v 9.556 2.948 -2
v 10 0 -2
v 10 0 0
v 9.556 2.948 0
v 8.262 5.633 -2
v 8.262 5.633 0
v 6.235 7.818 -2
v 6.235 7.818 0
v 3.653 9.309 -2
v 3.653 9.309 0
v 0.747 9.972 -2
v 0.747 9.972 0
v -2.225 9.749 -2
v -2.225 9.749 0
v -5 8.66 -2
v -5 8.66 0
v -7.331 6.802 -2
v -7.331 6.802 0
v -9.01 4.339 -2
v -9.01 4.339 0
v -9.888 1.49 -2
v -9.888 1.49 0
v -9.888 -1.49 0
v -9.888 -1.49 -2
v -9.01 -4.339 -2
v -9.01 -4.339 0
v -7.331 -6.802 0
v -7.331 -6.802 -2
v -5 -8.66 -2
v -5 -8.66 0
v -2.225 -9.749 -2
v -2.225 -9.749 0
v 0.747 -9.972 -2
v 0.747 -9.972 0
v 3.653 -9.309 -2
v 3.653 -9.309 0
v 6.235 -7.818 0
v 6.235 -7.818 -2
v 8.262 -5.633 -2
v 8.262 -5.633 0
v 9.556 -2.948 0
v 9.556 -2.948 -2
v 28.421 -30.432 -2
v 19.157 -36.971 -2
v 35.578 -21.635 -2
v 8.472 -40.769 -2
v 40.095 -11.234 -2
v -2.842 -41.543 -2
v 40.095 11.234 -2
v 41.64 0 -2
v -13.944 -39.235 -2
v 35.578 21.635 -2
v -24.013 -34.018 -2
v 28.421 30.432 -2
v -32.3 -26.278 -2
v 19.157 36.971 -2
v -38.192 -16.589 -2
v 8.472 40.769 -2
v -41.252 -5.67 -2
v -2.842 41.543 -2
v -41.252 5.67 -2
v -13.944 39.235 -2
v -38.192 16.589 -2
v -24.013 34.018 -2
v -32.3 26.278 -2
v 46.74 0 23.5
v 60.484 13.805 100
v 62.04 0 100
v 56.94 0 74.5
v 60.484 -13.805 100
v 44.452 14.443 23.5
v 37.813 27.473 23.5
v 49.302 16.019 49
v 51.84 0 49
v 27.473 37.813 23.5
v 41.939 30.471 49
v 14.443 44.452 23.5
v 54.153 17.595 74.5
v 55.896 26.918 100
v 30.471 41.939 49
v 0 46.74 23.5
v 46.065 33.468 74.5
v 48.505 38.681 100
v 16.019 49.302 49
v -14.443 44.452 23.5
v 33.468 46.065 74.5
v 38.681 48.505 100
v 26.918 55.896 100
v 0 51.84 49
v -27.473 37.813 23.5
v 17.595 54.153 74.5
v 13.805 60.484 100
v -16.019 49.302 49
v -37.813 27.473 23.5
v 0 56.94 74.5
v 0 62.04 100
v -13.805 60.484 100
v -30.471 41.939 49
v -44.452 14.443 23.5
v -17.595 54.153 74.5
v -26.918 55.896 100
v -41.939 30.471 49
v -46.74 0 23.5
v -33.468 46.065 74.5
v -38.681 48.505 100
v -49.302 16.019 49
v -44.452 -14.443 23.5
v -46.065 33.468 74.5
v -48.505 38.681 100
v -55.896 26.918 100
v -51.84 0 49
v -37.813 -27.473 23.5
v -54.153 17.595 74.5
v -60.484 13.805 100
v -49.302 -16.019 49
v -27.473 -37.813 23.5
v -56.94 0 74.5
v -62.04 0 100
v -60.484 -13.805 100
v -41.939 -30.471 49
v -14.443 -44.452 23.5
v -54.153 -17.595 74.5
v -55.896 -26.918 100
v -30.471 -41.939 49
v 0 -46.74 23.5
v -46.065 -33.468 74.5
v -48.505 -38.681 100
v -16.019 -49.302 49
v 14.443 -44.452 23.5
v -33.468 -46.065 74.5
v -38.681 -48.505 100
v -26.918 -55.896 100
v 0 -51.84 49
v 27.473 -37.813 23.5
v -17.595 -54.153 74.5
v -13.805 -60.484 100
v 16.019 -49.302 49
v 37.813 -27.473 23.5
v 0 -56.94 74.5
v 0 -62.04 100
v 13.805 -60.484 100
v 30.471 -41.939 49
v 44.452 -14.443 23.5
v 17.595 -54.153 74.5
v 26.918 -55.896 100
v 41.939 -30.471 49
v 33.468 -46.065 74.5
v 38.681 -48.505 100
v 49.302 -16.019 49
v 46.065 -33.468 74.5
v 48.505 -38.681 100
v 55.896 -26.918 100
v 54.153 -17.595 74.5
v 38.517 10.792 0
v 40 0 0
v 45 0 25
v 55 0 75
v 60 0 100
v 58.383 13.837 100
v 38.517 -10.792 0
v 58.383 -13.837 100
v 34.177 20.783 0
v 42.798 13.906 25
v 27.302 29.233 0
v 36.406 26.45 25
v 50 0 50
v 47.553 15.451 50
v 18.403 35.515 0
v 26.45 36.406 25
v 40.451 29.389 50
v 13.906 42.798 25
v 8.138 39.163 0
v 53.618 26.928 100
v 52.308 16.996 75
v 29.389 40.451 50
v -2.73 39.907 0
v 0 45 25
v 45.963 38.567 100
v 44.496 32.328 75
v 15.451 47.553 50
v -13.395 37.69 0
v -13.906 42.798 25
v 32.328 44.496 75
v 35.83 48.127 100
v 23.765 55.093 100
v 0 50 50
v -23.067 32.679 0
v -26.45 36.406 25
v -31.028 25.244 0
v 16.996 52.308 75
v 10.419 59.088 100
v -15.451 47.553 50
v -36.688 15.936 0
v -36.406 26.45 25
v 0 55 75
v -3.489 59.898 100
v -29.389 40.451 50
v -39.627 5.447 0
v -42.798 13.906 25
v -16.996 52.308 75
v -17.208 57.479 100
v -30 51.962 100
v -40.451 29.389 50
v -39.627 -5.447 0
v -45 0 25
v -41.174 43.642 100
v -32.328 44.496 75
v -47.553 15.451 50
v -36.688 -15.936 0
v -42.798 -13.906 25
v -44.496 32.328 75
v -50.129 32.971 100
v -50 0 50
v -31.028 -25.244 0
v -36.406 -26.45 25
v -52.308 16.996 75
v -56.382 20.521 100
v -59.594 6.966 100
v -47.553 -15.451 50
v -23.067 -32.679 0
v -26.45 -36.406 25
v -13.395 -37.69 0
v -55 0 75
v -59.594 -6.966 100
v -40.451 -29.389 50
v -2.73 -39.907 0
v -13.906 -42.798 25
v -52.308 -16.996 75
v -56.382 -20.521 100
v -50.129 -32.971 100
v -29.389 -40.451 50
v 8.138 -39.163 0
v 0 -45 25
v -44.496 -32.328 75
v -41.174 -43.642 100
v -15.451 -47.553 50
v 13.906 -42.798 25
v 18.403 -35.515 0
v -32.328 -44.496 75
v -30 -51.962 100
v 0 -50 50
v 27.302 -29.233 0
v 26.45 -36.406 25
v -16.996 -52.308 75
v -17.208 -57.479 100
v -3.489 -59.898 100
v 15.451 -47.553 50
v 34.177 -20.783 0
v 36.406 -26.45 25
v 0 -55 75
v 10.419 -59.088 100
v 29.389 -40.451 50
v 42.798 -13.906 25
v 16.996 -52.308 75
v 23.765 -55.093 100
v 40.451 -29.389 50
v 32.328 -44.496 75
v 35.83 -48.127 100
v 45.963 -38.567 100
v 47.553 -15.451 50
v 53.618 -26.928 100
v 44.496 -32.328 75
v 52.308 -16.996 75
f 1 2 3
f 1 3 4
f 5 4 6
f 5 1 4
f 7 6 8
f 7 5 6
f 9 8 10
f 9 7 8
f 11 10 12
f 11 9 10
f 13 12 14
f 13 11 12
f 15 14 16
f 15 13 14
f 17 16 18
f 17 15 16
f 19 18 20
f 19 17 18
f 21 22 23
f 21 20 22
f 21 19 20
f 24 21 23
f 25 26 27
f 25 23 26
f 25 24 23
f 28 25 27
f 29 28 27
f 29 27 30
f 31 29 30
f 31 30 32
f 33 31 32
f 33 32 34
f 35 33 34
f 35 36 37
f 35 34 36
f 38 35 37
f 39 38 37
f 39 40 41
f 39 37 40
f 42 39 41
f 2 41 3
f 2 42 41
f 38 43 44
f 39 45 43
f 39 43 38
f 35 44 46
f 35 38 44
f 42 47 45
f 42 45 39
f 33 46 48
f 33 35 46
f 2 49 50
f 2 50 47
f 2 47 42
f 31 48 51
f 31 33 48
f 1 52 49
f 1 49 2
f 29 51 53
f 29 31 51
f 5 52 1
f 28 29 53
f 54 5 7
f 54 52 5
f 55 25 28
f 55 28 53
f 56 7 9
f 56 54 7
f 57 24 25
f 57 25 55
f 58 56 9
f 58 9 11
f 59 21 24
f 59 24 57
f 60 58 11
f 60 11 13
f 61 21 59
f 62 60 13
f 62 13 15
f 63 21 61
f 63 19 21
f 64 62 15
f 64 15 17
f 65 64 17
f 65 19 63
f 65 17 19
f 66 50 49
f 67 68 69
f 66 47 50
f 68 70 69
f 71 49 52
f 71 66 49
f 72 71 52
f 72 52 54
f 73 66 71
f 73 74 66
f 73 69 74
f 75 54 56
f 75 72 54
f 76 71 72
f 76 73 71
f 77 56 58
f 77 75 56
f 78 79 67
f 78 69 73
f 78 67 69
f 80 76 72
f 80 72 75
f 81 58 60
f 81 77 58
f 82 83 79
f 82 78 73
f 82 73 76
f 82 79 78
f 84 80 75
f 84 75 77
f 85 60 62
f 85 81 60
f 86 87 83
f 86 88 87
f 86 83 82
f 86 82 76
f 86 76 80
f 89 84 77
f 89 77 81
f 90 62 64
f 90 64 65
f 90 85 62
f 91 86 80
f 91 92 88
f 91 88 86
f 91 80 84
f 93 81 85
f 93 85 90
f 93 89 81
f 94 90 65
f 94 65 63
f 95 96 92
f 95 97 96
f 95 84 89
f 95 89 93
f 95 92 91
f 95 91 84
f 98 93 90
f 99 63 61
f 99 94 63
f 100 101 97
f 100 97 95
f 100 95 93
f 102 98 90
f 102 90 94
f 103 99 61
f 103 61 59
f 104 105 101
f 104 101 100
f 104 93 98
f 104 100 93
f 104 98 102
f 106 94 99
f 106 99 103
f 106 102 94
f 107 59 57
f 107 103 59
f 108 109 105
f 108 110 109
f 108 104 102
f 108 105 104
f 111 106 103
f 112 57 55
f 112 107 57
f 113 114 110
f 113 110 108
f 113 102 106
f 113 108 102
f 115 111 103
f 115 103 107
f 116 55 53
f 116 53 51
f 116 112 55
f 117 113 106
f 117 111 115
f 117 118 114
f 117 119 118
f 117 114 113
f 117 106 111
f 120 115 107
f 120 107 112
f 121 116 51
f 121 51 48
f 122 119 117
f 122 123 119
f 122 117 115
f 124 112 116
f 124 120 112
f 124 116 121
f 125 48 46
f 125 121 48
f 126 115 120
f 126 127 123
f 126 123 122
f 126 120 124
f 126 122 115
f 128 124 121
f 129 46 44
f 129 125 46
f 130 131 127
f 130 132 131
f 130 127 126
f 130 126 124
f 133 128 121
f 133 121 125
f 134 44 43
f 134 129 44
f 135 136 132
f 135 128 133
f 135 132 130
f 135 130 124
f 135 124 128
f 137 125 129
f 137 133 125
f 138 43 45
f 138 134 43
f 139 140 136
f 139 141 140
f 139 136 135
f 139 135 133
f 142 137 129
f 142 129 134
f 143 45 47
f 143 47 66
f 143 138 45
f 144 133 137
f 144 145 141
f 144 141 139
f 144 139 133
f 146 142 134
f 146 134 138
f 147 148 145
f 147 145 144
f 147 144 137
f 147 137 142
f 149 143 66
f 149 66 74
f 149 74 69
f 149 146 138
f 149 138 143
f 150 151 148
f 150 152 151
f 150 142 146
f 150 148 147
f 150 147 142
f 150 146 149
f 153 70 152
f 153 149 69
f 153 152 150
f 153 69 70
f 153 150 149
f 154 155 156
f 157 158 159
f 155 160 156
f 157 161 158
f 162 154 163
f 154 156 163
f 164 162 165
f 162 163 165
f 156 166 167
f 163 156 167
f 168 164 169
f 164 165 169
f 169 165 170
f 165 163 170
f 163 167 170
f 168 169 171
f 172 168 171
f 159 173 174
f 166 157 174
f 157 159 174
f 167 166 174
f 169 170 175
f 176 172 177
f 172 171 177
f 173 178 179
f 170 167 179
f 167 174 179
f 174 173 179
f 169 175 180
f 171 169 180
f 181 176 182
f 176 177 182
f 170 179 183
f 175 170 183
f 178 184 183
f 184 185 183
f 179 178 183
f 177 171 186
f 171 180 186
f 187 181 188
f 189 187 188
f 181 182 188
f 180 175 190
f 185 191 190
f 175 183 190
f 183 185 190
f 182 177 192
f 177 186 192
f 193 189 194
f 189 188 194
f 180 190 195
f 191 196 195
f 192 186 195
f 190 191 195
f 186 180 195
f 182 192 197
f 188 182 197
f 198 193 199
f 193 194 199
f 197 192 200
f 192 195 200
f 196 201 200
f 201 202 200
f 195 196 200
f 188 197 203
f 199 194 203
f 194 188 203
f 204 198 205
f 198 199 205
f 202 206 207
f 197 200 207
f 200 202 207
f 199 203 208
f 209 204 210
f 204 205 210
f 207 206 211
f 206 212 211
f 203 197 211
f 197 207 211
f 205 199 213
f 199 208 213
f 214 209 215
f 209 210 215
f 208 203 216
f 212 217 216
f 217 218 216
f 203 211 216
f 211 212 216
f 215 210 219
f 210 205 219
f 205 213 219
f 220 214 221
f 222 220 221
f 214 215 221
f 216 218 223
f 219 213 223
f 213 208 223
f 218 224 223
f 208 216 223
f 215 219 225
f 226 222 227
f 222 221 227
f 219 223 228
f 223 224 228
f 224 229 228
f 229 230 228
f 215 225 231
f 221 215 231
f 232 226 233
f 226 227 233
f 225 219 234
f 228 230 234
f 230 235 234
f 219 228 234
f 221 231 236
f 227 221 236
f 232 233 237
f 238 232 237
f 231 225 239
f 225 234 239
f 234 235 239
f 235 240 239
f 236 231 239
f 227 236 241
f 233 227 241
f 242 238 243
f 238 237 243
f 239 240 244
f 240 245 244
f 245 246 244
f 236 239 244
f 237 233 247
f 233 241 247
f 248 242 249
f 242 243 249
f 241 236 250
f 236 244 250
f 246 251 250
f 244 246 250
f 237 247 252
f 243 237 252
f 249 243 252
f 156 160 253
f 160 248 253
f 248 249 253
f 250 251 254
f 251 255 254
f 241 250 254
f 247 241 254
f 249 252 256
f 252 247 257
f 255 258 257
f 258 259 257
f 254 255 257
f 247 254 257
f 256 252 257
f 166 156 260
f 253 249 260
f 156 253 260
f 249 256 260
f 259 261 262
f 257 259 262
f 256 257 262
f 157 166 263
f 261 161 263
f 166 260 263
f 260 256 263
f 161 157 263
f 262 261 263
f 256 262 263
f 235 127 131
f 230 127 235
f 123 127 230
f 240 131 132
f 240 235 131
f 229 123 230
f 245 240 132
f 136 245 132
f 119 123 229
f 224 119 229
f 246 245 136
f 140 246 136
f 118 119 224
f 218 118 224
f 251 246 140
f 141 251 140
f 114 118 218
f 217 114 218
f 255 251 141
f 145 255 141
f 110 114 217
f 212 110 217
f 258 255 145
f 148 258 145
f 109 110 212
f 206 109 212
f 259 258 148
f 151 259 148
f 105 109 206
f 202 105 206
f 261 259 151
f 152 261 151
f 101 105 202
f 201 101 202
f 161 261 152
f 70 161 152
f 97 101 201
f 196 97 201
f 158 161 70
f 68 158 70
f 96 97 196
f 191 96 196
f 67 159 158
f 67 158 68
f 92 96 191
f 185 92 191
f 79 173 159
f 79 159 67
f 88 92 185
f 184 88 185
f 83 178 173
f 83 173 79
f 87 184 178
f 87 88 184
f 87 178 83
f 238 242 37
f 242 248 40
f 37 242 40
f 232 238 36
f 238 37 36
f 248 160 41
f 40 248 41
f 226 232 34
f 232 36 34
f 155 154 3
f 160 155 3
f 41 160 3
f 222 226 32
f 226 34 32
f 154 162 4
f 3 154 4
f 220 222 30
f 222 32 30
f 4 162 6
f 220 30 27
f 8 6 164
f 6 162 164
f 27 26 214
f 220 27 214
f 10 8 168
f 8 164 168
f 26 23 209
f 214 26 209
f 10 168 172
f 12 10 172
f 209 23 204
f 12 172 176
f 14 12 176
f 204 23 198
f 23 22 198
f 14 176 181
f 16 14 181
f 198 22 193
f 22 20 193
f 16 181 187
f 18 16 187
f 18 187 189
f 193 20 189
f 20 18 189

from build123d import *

# Parameters (mm, degrees)
CYLINDER_R     = 10
CYLINDER_DEPTH = 10
THICKNESS_T    = 2


with BuildPart() as cilindro:
    # Cylinder → Cylinder (new body)
    with BuildSketch(Plane.XY.offset(-5)):
        Circle(CYLINDER_R)
    extrude(amount=CYLINDER_DEPTH)


with BuildPart() as cut:
    # Cone → Cone (revolve)
    with BuildSketch(Plane.XZ):
        Polygon((0, 0), (40, 0), (60, 100), (0, 100), align=None)
    revolve(axis=Axis((0, 0, 0), (0, 0, 1)))

    # Thickness
    thickness_openings = [cut.faces().sort_by_distance(p)[0] for p in [
        (0, 0, 100),
    ]]
    offset(amount=THICKNESS_T, openings=thickness_openings, kind=Kind.INTERSECTION)

    # Cut: cut Cilindro
    add(cilindro.part, mode=Mode.SUBTRACT)


solid = cut.part
